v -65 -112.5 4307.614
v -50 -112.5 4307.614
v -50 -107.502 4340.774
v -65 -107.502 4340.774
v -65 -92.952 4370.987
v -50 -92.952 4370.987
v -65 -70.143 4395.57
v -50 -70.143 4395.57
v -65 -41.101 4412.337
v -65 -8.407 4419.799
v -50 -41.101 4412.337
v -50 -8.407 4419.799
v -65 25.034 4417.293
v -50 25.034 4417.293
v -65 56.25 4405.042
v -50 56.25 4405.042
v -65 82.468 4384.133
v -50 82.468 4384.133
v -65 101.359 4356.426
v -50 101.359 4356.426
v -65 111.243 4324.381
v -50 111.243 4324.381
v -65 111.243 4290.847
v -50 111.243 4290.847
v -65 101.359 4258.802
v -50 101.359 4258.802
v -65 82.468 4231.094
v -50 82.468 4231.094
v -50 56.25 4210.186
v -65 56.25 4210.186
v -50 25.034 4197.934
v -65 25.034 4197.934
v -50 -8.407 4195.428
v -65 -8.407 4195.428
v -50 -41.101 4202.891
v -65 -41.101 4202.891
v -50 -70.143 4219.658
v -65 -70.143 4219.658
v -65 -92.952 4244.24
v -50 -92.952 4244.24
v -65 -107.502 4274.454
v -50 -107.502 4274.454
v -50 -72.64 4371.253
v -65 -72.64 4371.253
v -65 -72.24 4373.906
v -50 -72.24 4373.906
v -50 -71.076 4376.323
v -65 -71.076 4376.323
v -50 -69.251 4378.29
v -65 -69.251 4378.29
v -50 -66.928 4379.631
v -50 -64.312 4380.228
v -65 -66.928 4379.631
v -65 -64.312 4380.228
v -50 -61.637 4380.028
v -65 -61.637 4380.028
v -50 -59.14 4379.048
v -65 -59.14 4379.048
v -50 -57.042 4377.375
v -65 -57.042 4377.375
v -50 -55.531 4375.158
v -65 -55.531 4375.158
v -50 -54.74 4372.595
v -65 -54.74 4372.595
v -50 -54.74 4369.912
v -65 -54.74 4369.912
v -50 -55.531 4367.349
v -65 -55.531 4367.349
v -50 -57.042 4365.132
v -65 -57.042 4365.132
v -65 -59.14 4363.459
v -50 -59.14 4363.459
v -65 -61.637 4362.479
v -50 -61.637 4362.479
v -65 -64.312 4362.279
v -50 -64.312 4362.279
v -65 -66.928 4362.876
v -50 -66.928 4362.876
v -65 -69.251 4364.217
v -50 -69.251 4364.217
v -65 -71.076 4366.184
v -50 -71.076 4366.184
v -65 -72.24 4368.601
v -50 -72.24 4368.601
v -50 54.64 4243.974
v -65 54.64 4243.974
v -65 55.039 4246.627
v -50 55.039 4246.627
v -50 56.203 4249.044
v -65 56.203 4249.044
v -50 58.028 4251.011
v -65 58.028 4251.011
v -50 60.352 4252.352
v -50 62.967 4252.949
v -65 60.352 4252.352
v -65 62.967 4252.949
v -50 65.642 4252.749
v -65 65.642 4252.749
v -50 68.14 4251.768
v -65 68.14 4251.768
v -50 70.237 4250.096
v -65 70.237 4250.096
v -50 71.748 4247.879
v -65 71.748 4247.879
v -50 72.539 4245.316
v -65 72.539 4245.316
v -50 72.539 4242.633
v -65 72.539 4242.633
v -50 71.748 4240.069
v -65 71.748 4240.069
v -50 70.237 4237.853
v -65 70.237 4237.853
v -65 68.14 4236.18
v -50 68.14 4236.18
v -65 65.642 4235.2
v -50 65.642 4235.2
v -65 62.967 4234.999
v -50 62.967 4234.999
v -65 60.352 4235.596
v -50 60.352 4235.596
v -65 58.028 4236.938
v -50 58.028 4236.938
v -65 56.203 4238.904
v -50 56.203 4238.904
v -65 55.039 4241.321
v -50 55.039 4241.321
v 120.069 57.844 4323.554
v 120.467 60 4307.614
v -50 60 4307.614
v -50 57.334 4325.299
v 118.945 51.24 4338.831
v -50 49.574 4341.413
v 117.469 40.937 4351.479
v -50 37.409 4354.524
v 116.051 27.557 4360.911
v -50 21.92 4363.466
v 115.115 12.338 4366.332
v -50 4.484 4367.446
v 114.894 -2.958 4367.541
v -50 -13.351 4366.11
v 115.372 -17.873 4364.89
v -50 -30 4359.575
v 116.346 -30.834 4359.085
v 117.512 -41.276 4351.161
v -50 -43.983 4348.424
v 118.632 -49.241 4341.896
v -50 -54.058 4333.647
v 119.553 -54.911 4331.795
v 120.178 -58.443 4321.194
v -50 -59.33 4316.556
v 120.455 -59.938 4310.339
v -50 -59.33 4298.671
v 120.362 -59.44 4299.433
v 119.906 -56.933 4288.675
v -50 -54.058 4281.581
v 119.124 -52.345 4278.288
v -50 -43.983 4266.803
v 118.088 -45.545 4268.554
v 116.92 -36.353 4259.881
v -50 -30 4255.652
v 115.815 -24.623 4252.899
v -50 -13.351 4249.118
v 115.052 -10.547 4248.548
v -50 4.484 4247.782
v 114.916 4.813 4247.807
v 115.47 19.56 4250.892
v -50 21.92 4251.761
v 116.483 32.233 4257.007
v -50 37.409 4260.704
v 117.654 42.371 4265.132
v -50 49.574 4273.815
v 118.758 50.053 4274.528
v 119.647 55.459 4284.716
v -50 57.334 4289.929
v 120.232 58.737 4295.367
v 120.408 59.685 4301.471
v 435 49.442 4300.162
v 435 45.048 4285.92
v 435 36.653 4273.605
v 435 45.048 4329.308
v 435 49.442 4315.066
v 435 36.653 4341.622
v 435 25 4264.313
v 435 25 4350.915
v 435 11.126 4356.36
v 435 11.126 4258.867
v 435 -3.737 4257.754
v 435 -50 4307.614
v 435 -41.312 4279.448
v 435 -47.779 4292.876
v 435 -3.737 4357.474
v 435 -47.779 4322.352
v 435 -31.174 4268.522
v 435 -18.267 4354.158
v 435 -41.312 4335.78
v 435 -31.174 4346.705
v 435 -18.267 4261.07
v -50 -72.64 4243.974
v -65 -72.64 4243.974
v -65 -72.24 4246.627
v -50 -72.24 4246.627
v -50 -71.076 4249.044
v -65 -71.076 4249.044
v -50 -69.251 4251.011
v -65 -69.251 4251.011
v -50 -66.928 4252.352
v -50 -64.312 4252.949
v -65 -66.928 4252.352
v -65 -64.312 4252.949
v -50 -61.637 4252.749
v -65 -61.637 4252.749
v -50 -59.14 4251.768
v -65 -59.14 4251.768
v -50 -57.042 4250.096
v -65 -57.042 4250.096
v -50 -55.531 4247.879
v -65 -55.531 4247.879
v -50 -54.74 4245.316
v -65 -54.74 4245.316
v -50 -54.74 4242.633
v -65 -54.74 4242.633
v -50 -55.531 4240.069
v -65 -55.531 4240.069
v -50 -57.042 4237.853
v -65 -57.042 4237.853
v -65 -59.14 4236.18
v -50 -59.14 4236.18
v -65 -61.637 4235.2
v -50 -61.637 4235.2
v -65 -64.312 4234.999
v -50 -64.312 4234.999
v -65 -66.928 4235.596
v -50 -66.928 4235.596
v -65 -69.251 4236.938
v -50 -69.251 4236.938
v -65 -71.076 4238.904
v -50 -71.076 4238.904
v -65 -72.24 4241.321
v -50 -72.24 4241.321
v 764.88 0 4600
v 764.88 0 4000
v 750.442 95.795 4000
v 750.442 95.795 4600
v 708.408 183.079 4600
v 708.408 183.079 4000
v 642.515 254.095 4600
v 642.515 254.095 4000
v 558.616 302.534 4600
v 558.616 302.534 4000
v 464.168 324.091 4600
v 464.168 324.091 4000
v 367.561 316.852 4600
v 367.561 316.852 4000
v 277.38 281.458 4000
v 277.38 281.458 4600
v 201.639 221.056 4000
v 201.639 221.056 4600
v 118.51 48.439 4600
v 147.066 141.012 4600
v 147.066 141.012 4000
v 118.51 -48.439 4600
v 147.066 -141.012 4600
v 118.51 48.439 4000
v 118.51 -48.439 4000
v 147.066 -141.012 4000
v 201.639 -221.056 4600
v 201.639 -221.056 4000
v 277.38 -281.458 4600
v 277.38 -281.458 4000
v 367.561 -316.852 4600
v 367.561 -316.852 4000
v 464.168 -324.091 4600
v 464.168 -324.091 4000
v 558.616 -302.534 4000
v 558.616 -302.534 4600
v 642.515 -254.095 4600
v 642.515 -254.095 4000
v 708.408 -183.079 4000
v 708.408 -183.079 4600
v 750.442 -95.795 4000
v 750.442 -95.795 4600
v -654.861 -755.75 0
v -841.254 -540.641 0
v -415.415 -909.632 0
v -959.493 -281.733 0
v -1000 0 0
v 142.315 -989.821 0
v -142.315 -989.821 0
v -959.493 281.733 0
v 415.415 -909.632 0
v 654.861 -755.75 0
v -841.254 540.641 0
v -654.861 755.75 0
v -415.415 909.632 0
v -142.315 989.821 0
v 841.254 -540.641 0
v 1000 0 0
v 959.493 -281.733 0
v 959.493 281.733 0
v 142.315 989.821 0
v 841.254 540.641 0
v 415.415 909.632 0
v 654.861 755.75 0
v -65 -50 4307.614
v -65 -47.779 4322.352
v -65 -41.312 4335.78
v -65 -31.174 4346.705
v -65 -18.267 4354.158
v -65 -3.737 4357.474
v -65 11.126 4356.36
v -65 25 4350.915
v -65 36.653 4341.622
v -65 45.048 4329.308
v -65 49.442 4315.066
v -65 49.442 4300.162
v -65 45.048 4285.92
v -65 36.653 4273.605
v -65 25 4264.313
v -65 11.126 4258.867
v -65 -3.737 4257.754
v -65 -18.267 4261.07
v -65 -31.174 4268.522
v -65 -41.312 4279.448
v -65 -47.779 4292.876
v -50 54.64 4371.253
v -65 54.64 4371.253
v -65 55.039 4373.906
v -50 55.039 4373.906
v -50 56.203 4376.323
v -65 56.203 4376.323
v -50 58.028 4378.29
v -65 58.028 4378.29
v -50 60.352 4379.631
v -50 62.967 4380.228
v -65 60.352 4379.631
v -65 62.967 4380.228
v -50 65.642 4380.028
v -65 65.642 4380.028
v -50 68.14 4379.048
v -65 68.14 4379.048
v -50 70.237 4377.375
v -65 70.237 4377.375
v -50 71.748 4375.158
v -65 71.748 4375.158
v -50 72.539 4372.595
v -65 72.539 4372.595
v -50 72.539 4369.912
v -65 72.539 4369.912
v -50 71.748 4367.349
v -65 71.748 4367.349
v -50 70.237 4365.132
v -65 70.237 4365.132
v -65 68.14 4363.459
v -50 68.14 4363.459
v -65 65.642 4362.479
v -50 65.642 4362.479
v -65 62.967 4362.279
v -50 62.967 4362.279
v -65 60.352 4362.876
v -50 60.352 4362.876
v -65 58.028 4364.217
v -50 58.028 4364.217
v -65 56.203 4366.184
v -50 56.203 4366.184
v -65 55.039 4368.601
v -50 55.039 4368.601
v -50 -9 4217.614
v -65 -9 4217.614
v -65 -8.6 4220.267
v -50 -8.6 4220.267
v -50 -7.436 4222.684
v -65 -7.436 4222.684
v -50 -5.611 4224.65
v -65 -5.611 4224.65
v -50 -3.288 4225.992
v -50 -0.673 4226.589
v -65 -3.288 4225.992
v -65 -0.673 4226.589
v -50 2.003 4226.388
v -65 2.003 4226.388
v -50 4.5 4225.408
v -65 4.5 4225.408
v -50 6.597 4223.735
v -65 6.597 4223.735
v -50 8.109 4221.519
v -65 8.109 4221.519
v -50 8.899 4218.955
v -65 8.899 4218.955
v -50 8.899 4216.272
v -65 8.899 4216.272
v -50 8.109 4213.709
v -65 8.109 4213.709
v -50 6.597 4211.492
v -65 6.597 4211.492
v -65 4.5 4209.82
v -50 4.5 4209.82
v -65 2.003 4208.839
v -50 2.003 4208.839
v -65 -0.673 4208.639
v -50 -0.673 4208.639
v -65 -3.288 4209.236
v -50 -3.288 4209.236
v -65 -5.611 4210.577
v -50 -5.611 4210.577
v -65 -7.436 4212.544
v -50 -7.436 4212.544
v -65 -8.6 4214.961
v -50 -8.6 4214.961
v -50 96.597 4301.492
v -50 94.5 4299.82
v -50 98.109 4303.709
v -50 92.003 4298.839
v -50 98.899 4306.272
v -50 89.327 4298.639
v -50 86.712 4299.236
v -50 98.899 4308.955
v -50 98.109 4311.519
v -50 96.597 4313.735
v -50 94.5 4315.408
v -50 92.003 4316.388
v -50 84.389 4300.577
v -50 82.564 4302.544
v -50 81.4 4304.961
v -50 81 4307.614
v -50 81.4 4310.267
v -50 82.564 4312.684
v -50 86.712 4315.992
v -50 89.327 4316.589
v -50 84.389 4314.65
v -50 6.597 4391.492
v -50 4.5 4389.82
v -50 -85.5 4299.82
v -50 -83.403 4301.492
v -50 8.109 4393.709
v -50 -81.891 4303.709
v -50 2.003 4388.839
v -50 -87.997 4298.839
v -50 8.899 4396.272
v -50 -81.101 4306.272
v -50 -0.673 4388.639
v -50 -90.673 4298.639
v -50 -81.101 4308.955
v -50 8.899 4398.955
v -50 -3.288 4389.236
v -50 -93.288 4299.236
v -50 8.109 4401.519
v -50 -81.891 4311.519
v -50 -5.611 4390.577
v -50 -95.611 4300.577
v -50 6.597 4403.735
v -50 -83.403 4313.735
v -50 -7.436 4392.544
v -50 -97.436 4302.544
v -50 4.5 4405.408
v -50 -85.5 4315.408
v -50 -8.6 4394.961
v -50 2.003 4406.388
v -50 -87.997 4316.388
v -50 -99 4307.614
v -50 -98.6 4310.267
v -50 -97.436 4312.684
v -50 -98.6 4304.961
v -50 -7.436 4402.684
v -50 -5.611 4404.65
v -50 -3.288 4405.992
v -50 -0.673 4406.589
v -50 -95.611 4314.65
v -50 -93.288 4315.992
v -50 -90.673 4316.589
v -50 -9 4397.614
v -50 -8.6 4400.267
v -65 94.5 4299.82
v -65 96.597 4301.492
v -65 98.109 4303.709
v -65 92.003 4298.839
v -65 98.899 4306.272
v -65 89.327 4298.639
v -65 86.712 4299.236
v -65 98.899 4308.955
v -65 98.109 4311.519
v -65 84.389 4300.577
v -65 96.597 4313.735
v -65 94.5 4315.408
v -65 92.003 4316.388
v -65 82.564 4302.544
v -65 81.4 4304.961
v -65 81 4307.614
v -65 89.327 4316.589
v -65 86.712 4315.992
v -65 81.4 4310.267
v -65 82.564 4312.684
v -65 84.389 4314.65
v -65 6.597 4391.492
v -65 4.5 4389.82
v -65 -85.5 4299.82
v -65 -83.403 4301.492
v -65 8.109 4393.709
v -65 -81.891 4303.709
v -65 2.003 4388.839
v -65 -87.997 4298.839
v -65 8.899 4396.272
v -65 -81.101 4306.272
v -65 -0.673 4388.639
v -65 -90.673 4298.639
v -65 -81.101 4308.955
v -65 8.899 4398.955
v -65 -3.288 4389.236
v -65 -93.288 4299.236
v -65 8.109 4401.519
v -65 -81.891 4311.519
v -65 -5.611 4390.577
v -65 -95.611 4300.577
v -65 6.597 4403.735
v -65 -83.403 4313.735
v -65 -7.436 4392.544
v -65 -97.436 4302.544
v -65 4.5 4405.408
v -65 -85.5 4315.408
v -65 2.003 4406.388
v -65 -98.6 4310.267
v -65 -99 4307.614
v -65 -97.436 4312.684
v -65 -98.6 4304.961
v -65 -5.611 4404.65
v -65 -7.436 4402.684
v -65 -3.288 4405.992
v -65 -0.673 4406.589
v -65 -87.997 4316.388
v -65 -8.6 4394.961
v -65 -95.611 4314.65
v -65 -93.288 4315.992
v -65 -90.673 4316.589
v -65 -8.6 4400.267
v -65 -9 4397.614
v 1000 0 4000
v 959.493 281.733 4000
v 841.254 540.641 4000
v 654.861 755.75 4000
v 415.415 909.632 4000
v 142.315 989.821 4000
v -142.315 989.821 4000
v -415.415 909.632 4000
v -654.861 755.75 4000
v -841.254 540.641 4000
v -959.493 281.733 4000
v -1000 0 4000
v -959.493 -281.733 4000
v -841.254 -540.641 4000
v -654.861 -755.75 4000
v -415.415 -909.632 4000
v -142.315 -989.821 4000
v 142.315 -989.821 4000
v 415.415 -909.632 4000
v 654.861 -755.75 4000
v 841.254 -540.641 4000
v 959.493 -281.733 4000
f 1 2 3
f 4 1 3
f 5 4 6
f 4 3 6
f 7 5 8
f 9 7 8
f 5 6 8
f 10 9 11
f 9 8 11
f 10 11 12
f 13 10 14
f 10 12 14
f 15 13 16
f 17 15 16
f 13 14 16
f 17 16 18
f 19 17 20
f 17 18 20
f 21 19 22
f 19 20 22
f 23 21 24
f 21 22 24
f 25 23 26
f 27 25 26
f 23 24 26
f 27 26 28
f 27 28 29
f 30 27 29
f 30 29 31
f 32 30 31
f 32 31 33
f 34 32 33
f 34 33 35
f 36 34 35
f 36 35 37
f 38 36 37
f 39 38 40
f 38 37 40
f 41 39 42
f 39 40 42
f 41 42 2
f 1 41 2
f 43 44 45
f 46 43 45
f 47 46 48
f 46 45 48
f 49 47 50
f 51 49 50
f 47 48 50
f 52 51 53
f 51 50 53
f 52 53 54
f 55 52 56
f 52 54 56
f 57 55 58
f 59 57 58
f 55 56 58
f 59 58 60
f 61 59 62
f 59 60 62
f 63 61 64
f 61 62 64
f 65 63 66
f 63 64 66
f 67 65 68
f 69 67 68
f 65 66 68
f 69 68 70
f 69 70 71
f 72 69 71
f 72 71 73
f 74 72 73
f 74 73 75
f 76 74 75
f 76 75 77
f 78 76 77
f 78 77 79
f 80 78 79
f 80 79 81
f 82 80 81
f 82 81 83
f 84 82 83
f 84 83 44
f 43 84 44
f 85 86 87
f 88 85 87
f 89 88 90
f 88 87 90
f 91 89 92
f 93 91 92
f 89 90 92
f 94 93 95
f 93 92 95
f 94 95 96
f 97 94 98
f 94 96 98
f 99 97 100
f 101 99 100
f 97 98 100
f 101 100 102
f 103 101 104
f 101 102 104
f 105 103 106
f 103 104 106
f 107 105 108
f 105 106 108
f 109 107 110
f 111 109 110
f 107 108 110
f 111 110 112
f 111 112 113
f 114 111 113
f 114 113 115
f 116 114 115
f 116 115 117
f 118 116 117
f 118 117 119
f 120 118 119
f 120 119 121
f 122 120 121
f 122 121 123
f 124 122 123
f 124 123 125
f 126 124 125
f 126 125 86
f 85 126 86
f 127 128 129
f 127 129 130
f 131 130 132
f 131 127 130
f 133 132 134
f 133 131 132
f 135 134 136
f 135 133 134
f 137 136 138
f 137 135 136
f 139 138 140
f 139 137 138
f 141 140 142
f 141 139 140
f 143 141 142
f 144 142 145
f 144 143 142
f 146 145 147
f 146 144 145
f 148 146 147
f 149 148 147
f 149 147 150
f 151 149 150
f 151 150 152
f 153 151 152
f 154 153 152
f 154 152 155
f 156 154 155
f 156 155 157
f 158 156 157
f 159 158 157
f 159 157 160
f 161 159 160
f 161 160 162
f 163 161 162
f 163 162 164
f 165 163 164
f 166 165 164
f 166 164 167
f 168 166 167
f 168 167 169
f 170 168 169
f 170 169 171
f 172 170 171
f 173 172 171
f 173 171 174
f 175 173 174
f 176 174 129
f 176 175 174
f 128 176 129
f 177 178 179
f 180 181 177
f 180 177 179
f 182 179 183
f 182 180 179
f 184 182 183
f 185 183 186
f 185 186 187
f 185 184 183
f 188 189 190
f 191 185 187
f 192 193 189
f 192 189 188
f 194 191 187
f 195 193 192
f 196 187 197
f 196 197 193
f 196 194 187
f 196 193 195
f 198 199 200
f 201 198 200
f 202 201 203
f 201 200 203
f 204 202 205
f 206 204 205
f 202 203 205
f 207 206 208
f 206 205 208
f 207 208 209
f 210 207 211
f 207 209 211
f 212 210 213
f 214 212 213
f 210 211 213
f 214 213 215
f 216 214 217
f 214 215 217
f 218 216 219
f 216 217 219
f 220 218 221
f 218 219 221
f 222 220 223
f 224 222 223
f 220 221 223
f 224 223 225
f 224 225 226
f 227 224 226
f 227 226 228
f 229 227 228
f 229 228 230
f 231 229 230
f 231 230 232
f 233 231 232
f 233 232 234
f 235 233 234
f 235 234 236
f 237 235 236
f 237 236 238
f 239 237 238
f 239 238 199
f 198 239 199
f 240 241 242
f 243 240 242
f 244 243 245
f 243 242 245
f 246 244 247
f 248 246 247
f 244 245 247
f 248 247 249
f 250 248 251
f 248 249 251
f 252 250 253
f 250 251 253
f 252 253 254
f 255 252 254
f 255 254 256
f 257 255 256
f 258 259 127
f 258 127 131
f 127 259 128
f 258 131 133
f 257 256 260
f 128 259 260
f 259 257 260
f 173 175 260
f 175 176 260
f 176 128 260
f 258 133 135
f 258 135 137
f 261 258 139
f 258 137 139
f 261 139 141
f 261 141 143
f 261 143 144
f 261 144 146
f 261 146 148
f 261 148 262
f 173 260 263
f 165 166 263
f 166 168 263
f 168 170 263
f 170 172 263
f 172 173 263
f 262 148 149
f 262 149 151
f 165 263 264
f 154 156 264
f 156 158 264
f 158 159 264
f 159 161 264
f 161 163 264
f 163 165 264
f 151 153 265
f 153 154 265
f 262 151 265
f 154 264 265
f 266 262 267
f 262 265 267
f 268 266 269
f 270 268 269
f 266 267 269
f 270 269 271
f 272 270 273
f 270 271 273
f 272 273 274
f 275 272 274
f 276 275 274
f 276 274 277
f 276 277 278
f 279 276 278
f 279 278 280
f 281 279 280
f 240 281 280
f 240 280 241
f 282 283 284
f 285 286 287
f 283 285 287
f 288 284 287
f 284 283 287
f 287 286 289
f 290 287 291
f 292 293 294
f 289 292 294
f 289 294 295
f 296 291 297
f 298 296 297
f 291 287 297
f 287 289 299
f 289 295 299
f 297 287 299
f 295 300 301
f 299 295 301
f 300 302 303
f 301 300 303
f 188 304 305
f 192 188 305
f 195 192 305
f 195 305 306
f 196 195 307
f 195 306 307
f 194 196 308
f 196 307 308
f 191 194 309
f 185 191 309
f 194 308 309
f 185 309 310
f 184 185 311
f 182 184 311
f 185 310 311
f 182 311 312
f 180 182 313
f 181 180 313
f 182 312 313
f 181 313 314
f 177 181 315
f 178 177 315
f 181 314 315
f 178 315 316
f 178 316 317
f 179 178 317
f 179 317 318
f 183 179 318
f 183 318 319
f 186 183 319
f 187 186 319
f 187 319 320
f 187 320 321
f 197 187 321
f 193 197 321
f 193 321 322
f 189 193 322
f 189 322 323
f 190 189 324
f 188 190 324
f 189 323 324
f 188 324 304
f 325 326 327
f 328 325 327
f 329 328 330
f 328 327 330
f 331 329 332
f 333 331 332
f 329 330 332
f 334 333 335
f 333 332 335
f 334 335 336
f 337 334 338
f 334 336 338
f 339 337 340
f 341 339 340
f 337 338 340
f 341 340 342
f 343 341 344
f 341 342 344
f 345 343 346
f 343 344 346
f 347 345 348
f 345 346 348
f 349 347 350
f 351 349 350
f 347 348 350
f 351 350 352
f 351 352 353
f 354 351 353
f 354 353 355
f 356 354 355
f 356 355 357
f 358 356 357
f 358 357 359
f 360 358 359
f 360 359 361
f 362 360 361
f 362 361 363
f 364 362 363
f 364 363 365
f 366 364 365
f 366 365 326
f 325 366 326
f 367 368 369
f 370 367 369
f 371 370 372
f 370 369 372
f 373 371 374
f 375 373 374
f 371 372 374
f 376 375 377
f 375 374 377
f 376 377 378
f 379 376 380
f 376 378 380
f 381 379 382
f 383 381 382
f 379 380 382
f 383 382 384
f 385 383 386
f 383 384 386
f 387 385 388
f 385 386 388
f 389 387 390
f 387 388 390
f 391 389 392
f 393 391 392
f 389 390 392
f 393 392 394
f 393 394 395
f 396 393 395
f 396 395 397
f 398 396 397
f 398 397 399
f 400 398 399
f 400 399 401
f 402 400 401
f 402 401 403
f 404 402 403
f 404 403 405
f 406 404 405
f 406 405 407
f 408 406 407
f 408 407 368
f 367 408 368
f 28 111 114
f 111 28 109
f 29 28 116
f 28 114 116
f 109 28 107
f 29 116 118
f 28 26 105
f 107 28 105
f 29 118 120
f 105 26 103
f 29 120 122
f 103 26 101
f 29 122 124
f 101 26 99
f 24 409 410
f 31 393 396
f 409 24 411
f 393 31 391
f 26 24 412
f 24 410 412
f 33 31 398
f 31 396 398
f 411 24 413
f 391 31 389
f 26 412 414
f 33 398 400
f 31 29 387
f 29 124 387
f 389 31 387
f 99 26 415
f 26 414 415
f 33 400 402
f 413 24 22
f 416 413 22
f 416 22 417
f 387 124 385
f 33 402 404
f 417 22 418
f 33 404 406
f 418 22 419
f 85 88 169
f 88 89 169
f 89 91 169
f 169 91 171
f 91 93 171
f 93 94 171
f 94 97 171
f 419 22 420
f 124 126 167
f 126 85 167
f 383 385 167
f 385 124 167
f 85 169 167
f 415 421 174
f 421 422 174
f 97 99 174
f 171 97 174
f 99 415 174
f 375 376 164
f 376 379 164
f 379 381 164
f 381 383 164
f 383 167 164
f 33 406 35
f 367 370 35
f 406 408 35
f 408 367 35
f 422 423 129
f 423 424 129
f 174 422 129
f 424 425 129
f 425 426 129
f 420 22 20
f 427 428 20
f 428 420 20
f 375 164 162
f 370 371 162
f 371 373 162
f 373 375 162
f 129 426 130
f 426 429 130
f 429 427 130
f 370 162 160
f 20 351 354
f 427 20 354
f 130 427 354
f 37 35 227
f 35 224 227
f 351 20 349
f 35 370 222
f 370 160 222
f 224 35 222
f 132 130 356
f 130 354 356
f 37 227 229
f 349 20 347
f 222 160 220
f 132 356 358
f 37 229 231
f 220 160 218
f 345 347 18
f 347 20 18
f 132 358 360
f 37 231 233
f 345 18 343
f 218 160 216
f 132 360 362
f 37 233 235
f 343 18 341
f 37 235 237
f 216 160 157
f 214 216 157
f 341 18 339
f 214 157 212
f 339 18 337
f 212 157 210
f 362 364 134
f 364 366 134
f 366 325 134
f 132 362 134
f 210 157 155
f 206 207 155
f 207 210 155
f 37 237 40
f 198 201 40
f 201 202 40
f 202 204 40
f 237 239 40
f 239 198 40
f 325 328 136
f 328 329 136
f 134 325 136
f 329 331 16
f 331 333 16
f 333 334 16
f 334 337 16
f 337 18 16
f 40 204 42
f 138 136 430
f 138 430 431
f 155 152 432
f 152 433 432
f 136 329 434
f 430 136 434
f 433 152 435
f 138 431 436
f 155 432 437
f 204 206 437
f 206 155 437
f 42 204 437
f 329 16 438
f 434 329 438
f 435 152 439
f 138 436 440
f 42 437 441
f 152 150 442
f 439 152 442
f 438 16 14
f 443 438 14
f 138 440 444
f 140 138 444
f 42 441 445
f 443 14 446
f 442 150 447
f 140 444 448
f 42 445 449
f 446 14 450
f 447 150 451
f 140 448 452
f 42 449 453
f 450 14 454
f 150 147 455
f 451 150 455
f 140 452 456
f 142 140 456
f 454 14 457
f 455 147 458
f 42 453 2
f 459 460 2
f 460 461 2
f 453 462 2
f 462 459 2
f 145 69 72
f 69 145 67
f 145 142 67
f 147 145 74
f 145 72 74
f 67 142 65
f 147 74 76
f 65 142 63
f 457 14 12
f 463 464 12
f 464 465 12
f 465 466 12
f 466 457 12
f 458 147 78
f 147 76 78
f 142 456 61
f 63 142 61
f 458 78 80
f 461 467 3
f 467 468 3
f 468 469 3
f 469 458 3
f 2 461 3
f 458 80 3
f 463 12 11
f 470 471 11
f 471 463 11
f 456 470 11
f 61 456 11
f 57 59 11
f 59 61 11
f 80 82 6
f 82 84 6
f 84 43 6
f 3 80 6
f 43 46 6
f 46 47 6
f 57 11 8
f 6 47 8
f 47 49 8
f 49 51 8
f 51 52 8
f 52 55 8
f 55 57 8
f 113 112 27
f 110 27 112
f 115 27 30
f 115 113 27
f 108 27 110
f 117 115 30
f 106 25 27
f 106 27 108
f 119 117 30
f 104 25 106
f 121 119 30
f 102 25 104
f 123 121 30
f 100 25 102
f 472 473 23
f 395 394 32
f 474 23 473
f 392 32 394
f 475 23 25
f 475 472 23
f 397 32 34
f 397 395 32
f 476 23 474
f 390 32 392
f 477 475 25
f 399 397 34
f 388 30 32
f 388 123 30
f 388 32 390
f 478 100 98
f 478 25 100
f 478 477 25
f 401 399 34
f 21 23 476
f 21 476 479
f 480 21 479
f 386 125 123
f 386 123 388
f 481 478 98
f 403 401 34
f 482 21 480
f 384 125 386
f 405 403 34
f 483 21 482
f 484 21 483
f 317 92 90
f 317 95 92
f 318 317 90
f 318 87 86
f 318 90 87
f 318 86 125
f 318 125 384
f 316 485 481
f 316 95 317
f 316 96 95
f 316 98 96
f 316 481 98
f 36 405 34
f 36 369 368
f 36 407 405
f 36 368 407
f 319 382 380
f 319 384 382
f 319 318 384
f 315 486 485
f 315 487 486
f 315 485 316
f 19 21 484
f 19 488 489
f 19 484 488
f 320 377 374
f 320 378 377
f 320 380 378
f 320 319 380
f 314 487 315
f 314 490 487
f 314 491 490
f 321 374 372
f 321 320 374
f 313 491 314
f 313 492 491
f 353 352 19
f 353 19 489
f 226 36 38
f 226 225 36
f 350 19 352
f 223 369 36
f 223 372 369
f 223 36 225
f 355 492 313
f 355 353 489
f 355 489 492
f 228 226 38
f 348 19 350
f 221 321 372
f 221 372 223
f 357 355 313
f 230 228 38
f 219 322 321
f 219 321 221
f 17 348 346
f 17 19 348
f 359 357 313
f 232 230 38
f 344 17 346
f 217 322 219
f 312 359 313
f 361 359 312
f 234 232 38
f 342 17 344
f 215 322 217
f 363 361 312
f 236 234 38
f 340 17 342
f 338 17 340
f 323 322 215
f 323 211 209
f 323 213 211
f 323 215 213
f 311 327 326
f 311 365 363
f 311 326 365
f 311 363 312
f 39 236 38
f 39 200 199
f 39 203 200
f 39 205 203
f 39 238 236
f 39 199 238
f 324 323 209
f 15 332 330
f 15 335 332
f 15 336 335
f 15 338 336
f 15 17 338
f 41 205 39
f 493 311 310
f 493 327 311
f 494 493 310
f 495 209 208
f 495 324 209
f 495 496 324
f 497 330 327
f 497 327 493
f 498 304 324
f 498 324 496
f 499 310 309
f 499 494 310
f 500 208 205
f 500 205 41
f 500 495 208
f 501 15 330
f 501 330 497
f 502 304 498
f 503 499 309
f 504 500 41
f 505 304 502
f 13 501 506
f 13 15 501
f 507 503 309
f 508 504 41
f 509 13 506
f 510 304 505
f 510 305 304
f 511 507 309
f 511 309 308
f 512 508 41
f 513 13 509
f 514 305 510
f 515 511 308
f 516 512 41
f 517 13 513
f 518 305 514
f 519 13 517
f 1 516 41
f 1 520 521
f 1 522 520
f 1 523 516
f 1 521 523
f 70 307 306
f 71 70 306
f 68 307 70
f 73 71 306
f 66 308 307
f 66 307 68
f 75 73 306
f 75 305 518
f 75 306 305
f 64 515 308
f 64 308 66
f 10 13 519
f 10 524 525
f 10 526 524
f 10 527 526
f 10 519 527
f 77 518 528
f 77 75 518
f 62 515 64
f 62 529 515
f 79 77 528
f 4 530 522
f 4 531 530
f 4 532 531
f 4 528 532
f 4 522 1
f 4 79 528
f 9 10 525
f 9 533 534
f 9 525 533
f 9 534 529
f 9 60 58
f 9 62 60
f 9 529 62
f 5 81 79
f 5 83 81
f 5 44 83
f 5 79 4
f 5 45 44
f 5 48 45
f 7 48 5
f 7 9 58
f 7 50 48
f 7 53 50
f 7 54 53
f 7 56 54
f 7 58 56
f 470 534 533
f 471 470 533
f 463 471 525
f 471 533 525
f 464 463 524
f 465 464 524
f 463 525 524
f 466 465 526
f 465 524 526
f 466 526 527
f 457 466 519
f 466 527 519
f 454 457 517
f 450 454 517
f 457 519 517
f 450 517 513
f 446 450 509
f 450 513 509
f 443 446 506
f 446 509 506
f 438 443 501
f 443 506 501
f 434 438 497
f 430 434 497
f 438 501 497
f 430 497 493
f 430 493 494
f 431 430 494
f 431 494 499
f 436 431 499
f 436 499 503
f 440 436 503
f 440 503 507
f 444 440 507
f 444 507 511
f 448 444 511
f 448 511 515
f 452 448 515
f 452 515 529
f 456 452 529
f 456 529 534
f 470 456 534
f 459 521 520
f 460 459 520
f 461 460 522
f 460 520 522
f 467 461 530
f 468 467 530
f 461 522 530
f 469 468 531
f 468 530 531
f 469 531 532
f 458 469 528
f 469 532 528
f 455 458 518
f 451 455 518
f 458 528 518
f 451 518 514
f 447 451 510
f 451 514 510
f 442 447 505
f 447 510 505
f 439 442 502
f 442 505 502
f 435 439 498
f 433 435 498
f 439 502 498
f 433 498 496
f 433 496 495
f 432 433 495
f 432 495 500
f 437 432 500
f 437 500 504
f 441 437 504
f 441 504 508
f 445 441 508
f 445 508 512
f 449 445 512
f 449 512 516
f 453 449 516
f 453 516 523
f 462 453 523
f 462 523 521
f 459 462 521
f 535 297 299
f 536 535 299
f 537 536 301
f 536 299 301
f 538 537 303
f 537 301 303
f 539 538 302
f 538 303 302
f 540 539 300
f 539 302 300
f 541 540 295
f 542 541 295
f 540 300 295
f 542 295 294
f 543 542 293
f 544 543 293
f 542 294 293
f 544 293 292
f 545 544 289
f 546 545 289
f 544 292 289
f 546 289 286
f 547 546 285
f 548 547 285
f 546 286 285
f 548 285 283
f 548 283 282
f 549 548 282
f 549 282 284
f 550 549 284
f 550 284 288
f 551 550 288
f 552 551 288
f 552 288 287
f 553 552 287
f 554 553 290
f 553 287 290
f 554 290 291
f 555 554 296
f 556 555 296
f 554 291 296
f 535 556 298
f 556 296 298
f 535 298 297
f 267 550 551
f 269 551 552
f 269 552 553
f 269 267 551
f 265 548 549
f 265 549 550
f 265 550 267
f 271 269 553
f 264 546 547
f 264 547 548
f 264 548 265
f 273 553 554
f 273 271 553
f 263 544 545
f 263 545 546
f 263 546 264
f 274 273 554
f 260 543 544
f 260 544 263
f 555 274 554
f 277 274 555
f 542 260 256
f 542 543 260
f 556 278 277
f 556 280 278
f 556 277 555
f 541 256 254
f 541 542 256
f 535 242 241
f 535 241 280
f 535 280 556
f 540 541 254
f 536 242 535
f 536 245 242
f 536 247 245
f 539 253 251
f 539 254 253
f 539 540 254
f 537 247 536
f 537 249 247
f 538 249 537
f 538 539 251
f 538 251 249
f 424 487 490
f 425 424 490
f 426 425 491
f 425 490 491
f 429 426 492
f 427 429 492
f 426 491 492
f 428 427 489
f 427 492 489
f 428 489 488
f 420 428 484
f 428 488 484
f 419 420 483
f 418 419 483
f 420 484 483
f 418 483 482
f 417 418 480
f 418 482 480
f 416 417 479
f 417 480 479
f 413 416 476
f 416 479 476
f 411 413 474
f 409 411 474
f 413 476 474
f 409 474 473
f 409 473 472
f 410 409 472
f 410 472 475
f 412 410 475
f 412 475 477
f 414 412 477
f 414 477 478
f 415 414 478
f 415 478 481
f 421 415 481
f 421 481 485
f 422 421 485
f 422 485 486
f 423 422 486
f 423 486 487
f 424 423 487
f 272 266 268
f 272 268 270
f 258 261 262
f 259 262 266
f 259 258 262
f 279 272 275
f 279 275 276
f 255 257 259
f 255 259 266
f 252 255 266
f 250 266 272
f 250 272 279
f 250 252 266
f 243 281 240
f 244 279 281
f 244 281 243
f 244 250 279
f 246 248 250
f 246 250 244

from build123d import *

# Parameters (mm, degrees)
F0_R      = 1000
F1_DEPTH  = 4000
F2_R      = 325
F3_DEPTH  = 600
F5_R      = 60
F6_DEPTH  = 250
F7_R      = 112.5
F7_R_2    = 60
F8_DEPTH  = 15
F9_R      = 50
F10_DEPTH = 500
F11_R     = 9
F12_DEPTH = 25


with BuildPart() as f1:
    # F0 (on Top) → F1 (new body)
    with BuildSketch(Plane.XY):
        Circle(F0_R)
    extrude(amount=F1_DEPTH)

    # F2 (on face) → F3 (join)
    with BuildSketch(Plane.XY.offset(4000)):
        with Locations((439.880490303, 0)):
            Circle(F2_R)
    extrude(amount=F3_DEPTH)

    # F5 (on offset) → F6 (join)
    with BuildSketch(Plane.YZ.offset(200)):
        with Locations((0, 4307.6138496399)):
            Circle(F5_R)
    extrude(amount=-F6_DEPTH)

    # F7 (on face) → F8 (join)
    with BuildSketch(Plane(origin=(-50, 0, 0), x_dir=(0, -1, 0), z_dir=(-1, 0, 0))):
        with Locations((0, 4307.6138496399)):
            Circle(F7_R)
        with Locations((0, 4307.6138496399)):
            Circle(F7_R_2, mode=Mode.SUBTRACT)
        with Locations((0, 4307.6138496399)):
            Circle(F7_R_2)
    extrude(amount=F8_DEPTH)

    # F9 (on face) → F10 (cut)
    with BuildSketch(Plane(origin=(-65, 0, 0), x_dir=(0, -1, 0), z_dir=(-1, 0, 0))):
        with Locations((0, 4307.6138496399)):
            Circle(F9_R)
    extrude(amount=-F10_DEPTH, mode=Mode.SUBTRACT)

    # F11 (on face) → F12 (cut)
    with BuildSketch(Plane(origin=(-65, 0, 0), x_dir=(0, -1, 0), z_dir=(-1, 0, 0))):
        with Locations((0, 4397.6138496399)):
            Circle(F11_R)
        with Locations((-63.6396103068, 4371.2534599467)):
            Circle(F11_R)
        with Locations((-90, 4307.6138496399)):
            Circle(F11_R)
        with Locations((-63.6396103068, 4243.9742393331)):
            Circle(F11_R)
        with Locations((0, 4217.6138496399)):
            Circle(F11_R)
        with Locations((63.6396103068, 4243.9742393331)):
            Circle(F11_R)
        with Locations((90, 4307.6138496399)):
            Circle(F11_R)
        with Locations((63.6396103068, 4371.2534599467)):
            Circle(F11_R)
    extrude(amount=-F12_DEPTH, mode=Mode.SUBTRACT)


solid = f1.part
